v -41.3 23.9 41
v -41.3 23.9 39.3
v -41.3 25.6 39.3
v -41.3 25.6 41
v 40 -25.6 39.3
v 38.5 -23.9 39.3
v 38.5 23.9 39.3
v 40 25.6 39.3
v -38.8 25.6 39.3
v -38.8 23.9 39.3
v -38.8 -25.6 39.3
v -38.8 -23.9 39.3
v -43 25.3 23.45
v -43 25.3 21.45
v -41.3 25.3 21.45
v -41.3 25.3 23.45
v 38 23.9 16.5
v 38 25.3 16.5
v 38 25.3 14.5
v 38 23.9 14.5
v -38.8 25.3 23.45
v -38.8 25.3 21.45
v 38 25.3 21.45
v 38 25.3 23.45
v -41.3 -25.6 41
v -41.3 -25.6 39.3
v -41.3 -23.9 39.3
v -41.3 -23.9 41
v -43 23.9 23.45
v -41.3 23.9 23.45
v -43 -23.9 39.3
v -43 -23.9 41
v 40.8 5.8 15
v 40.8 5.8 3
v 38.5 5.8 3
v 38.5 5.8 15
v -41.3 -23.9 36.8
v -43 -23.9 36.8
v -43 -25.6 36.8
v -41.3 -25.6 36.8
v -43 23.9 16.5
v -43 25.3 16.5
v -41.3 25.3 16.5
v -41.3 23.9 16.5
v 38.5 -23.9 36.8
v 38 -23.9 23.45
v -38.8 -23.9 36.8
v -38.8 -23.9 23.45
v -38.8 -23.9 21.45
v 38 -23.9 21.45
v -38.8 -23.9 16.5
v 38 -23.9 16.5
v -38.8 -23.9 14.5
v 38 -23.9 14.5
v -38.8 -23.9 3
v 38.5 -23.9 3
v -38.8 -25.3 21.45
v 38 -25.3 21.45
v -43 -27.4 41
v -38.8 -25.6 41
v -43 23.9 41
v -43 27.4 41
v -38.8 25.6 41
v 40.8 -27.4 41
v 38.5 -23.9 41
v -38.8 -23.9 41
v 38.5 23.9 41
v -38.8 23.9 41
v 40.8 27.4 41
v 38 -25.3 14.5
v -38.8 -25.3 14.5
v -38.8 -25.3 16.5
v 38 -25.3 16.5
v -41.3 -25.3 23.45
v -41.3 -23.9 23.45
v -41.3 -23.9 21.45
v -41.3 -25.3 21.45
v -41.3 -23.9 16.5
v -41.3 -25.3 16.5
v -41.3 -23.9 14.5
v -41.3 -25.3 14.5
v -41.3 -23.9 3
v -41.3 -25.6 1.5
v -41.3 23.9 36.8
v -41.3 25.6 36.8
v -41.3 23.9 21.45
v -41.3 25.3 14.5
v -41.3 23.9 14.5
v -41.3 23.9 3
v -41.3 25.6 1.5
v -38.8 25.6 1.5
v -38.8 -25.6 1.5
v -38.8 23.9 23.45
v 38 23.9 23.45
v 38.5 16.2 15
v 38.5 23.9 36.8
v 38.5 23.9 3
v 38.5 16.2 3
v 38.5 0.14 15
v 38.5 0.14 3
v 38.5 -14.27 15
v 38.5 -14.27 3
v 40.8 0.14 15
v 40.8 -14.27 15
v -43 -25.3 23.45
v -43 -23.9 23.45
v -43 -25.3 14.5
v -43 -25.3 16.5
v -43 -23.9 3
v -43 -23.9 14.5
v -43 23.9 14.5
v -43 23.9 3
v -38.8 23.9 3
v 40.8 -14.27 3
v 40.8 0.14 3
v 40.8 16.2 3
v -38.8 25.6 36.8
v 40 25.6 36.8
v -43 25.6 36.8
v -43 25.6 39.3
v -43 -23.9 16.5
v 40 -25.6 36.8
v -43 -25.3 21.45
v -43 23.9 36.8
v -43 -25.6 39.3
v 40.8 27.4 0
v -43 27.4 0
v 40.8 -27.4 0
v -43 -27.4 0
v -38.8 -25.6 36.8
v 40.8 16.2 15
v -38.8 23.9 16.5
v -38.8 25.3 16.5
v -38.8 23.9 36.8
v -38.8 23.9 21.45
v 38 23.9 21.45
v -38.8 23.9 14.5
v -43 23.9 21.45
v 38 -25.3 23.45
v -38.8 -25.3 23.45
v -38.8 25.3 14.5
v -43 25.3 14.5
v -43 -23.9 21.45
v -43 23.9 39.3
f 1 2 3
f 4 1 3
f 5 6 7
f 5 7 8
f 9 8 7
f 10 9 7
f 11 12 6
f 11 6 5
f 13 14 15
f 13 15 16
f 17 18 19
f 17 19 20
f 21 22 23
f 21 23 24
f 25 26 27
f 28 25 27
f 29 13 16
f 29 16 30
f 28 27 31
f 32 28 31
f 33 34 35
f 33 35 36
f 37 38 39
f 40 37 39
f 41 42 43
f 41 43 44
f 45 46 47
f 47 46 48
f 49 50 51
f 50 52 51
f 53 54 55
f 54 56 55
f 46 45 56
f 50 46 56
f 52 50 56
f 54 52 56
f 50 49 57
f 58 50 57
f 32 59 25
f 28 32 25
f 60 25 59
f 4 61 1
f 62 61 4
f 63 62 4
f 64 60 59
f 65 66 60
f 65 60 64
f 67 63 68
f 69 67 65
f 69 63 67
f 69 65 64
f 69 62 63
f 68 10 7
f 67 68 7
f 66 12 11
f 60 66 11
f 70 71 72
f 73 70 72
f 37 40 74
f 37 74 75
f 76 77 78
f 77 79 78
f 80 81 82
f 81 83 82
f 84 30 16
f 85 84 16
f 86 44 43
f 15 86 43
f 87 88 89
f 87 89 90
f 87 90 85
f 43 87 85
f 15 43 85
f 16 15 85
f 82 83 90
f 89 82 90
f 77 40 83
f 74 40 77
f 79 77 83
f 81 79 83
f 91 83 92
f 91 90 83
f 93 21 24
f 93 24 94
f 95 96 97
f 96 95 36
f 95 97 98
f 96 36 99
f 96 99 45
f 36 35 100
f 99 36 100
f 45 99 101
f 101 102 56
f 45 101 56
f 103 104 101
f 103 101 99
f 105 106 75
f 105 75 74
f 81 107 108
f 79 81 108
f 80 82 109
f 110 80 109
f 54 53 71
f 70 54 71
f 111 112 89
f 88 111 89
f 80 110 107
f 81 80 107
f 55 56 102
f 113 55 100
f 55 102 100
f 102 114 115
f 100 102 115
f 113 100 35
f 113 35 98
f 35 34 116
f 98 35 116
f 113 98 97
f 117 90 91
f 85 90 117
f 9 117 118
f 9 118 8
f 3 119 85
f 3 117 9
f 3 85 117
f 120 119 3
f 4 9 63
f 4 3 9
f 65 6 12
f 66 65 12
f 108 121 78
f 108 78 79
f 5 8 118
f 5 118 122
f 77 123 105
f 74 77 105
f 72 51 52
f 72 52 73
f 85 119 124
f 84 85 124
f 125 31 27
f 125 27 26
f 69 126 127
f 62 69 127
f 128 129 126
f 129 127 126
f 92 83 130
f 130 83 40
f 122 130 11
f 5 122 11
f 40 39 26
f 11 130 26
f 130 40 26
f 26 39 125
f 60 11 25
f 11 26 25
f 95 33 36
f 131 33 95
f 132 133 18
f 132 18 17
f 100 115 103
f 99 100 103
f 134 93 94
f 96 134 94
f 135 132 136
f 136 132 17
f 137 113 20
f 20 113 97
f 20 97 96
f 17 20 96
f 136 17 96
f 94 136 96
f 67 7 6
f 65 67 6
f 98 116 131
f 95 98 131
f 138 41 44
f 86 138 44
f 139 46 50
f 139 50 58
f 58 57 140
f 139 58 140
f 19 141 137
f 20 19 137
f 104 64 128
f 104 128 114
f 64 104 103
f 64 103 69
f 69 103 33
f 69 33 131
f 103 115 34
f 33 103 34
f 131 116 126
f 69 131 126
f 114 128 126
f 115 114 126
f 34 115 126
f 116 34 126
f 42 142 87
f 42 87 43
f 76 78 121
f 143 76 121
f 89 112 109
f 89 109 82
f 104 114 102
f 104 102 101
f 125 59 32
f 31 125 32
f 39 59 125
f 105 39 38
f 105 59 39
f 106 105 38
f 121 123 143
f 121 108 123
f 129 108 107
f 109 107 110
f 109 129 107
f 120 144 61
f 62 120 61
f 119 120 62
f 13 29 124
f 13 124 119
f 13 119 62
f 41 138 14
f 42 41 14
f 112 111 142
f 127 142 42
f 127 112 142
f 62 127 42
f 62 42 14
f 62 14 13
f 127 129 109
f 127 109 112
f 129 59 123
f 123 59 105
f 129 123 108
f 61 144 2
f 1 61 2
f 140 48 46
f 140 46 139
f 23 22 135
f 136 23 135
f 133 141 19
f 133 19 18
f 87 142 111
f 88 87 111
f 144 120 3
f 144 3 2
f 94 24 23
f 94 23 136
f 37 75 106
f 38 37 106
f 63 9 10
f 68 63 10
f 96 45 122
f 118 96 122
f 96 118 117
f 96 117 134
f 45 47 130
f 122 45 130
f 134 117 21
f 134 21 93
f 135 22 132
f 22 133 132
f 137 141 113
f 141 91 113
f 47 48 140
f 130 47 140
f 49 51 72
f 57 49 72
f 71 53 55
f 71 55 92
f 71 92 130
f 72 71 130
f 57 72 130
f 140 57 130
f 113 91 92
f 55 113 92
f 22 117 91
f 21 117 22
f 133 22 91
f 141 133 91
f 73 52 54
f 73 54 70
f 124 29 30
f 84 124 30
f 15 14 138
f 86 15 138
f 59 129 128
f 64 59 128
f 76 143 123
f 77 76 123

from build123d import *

# Parameters (mm, degrees)
F2_DEPTH  = 41
F1_W      = 1.7
F1_H      = 47.8
F1_W_2    = 77.3
F3_DEPTH  = 3
F1_W_3    = 2.5
F1_H_2    = 1.7
F4_DEPTH  = 1.5
F5_W      = 14.41
F5_H      = 12
F5_W_2    = 10.4
F6_DEPTH  = 3
F7_W      = 1.4
F7_H      = 2
F8_DEPTH  = 81
F9_W      = 1.7
F9_H      = 2.5
F10_DEPTH = 83
F11_W     = 47.8
F11_H     = 2.5
F12_DEPTH = 1.5


with BuildPart() as f2:
    # F1 (on Top) → F2 (new body)
    with BuildSketch(Plane.XY):
        Polygon((-43, 27.4), (-43, 23.9), (-41.3, 23.9), (-41.3, 25.6), (-38.8, 25.6), (-38.8, 23.9), (38.5, 23.9), (38.5, -23.9), (-38.8, -23.9), (-38.8, -25.6), (-41.3, -25.6), (-41.3, -23.9), (-43, -23.9), (-43, -27.4), (40.8, -27.4), (40.8, 27.4), align=None)
    extrude(amount=F2_DEPTH)

    # F1 (on Top) → F3 (join)
    with BuildSketch(Plane.XY):
        with Locations((-42.15, 0)):
            Rectangle(F1_W, F1_H)
        with Locations((-0.15, 0)):
            Rectangle(F1_W_2, F1_H)
    extrude(amount=F3_DEPTH)

    # F1 (on Top) → F4 (join)
    with BuildSketch(Plane.XY):
        with Locations((-40.05, -24.75)):
            Rectangle(F1_W_3, F1_H_2)
        with Locations((-40.05, 0)):
            Rectangle(F1_W_3, F1_H)
        with Locations((-40.05, 24.75)):
            Rectangle(F1_W_3, F1_H_2)
    extrude(amount=F4_DEPTH)

    # F5 (on face) → F6 (cut)
    with BuildSketch(Plane.YZ.offset(40.8)):
        with Locations((-7.065, 9)):
            Rectangle(F5_W, F5_H)
        with Locations((11, 9)):
            Rectangle(F5_W_2, F5_H)
    extrude(amount=-F6_DEPTH, mode=Mode.SUBTRACT)

    # F7 (on face) → F8 (cut)
    with BuildSketch(Plane(origin=(-43, 0, 0), x_dir=(0, -1, 0), z_dir=(-1, 0, 0))):
        with Locations((-24.6, 15.5)):
            Rectangle(F7_W, F7_H)
        with Locations((-24.6, 22.45)):
            Rectangle(F7_W, F7_H)
        with Locations((24.6, 15.5)):
            Rectangle(F7_W, F7_H)
        with Locations((24.6, 22.45)):
            Rectangle(F7_W, F7_H)
    extrude(amount=-F8_DEPTH, mode=Mode.SUBTRACT)

    # F9 (on face) → F10 (cut)
    with BuildSketch(Plane(origin=(-43, 0, 0), x_dir=(0, -1, 0), z_dir=(-1, 0, 0))):
        with Locations((-24.75, 38.05)):
            Rectangle(F9_W, F9_H)
        with Locations((24.75, 38.05)):
            Rectangle(F9_W, F9_H)
    extrude(amount=-F10_DEPTH, mode=Mode.SUBTRACT)

    # F11 (on face) → F12 (cut)
    with BuildSketch(Plane(origin=(38.5, 0, 0), x_dir=(0, -1, 0), z_dir=(-1, 0, 0))):
        with Locations((0, 38.05)):
            Rectangle(F11_W, F11_H)
    extrude(amount=-F12_DEPTH, mode=Mode.SUBTRACT)


solid = f2.part
